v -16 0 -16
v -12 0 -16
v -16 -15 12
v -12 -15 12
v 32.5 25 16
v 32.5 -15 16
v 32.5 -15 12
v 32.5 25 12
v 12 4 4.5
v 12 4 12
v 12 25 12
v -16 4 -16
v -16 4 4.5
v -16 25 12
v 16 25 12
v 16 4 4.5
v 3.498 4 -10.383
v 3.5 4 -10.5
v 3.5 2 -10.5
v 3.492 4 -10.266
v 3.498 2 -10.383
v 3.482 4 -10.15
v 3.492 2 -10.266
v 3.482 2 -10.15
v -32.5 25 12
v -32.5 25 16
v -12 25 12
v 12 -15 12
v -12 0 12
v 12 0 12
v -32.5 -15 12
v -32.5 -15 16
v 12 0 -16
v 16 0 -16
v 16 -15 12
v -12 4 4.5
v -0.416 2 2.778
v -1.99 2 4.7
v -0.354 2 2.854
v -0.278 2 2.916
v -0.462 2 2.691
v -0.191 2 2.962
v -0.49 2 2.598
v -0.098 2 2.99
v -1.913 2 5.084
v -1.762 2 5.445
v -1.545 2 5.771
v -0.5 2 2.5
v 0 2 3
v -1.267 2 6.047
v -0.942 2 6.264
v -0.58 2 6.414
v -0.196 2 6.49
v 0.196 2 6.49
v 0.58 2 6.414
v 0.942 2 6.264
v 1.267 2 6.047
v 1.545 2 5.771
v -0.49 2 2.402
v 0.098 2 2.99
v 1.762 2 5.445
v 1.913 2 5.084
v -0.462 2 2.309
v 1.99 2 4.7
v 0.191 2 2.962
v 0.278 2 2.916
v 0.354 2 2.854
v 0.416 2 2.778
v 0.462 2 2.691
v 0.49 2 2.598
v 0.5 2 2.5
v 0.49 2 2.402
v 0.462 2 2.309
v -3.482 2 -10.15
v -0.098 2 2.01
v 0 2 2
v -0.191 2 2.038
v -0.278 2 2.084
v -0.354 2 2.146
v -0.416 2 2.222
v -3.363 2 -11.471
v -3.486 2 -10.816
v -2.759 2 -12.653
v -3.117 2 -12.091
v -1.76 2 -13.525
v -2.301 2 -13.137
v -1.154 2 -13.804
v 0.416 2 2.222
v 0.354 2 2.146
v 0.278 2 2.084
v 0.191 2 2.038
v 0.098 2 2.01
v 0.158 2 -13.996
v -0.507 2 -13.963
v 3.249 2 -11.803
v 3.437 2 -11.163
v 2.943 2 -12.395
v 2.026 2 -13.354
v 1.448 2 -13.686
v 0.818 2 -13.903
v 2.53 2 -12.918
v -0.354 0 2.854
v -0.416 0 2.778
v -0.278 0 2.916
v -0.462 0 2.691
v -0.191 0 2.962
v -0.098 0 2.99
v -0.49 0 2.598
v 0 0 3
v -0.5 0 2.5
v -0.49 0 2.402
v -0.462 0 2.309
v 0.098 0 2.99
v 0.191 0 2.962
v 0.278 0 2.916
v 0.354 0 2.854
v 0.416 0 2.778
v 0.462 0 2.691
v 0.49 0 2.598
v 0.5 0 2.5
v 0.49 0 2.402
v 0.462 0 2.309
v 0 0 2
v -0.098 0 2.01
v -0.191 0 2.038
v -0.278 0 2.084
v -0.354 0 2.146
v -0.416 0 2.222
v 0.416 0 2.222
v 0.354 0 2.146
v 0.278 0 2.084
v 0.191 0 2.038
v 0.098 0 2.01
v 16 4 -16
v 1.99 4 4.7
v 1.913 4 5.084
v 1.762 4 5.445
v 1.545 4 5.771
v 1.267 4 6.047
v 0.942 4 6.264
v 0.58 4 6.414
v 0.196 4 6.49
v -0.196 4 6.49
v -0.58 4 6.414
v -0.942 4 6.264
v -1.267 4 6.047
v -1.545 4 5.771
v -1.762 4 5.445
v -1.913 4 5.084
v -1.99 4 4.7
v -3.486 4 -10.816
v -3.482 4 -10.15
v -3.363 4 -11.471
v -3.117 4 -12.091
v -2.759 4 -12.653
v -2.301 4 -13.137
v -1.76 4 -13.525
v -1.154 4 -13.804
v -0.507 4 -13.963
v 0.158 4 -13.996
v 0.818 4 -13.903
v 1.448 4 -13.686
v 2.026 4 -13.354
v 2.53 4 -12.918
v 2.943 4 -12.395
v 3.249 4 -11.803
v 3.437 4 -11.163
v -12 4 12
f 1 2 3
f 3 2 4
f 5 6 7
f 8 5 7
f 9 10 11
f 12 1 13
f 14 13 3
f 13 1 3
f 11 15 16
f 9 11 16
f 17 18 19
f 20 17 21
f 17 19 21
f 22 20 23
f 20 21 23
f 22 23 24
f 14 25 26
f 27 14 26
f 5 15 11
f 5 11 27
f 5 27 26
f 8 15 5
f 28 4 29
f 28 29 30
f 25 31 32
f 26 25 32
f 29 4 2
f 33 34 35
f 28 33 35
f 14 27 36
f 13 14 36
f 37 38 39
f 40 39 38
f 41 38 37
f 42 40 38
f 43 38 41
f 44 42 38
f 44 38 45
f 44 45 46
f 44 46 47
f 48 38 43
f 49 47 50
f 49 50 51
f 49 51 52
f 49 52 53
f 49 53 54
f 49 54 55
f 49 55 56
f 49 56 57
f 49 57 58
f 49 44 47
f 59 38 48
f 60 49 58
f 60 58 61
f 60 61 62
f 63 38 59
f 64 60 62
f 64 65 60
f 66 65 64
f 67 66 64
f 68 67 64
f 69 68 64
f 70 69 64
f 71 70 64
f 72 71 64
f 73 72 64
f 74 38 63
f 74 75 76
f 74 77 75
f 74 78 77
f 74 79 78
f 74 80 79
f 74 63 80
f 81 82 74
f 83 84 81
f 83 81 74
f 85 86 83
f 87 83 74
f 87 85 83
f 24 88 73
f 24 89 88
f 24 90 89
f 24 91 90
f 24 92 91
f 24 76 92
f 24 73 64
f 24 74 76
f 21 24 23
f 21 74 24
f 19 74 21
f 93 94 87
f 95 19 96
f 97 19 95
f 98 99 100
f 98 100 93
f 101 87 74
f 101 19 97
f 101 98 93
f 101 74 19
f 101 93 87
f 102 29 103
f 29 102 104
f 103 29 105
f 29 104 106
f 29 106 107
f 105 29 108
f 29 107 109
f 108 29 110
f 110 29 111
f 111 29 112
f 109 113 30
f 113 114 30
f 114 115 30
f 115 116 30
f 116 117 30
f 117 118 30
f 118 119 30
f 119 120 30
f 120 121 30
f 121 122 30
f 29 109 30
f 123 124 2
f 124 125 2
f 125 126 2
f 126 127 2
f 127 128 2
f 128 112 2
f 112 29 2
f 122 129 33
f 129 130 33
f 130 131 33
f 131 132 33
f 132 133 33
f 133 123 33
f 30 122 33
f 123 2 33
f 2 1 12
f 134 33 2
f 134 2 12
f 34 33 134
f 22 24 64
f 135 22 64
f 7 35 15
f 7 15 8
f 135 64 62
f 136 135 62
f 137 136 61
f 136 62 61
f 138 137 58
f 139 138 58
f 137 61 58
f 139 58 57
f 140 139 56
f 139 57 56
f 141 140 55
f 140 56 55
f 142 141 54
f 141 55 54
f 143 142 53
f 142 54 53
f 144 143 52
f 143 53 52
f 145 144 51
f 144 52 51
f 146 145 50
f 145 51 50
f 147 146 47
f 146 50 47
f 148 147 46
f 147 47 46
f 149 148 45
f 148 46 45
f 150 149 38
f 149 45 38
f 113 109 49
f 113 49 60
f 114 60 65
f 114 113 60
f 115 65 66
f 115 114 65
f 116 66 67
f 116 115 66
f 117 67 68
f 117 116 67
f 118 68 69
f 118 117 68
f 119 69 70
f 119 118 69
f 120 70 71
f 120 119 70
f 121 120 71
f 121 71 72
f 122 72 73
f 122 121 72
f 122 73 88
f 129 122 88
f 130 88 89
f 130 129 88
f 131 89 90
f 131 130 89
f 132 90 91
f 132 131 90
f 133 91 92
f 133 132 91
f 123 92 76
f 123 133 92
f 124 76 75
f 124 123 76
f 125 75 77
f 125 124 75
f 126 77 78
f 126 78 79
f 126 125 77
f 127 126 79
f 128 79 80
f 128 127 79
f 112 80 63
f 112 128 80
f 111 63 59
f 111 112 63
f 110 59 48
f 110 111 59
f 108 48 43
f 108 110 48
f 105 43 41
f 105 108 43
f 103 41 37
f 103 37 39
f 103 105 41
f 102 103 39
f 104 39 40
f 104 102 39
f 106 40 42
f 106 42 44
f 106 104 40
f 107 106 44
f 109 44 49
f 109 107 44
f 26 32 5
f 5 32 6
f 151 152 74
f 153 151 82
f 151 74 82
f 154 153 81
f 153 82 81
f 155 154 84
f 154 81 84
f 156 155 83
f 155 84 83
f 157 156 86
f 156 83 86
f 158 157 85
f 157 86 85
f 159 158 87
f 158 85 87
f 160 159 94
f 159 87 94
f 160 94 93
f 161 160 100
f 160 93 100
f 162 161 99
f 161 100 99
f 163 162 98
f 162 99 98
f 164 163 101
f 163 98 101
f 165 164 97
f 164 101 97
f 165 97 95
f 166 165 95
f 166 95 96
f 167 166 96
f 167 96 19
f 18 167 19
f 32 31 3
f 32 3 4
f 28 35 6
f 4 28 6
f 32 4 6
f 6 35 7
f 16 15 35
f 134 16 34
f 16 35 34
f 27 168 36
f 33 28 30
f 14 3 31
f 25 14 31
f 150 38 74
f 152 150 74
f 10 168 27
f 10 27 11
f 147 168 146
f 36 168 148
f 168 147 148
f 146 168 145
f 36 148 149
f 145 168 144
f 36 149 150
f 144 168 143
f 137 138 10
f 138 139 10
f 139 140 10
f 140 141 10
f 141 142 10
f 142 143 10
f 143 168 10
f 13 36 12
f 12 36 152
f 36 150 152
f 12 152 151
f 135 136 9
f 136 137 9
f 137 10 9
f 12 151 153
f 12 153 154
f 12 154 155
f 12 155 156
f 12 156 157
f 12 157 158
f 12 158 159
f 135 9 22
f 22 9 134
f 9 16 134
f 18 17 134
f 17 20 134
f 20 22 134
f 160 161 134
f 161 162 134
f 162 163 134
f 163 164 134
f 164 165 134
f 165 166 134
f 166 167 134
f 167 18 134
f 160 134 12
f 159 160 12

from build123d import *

# Parameters (mm, degrees)
SKETCH_1_W               = 24
SKETCH_1_H               = 28
EXTRUDE_2_DEPTH          = 4
SKETCH_1_5_R             = 0.5
EXTRUDE_4_DEPTH          = 2
EXTRUDE_5_DEPTH          = 25
EXTRUDE_5_DEPTH_BACK     = 15
CUT_EXTRUDE_1_DEPTH      = 54.490653389
CUT_EXTRUDE_1_DEPTH_BACK = 54.490653389
CUT_EXTRUDE_2_DEPTH      = 54.490653389
CUT_EXTRUDE_2_DEPTH_BACK = 54.490653389
CUT_EXTRUDE_4_DEPTH      = 54.490653389
CUT_EXTRUDE_4_DEPTH_BACK = 54.490653389


with BuildPart() as part:
    # 草图1 → 凸台-拉伸2 (new body)
    with BuildSketch(Plane(origin=(0, 0, 0), x_dir=(1, 0, 0), z_dir=(0, 1, 0))):
        with Locations((0, 2)):
            Rectangle(SKETCH_1_W, SKETCH_1_H)
        with BuildLine():
            Line((-1.989974874, -4.7), (-3.48245603, 10.15))
            ThreePointArc((-3.48245603, 10.15), (-0.175219713, 13.995611256), (3.5, 10.5))
            ThreePointArc((3.5, 10.5), (3.495611256, 10.324780287), (3.48245603, 10.15))
            Line((3.48245603, 10.15), (1.989974874, -4.7))
            ThreePointArc((1.989974874, -4.7), (0, -6.5), (-1.989974874, -4.7))
        make_face(mode=Mode.SUBTRACT)
    extrude(amount=EXTRUDE_2_DEPTH)

    # 草图1<5> → 凸台-拉伸4 (add)
    with BuildSketch(Plane(origin=(0, 0, 0), x_dir=(1, 0, 0), z_dir=(0, 1, 0))):
        with BuildLine():
            Line((1.989974874, -4.7), (3.48245603, 10.15))
            ThreePointArc((3.48245603, 10.15), (0, 14), (-3.48245603, 10.15))
            Line((-3.48245603, 10.15), (-1.989974874, -4.7))
            ThreePointArc((-1.989974874, -4.7), (0, -6.5), (1.989974874, -4.7))
        make_face()
        with Locations((0, -2.5)):
            Circle(SKETCH_1_5_R, mode=Mode.SUBTRACT)
    extrude(amount=EXTRUDE_4_DEPTH)

    # 草图1<6> → 凸台-拉伸5 (add, two sides: drawn at the far end of the back side and taken through both)
    with BuildSketch(Plane(origin=(0, 0, 0), x_dir=(1, 0, 0), z_dir=(0, 1, 0)).offset(-EXTRUDE_5_DEPTH_BACK)):
        Polygon((-12, 16), (-16, 16), (-16, -12), (-32.5, -12), (-32.5, -16), (32.5, -16), (32.5, -12), (16, -12), (16, 16), (12, 16), (12, -12), (-12, -12), align=None)
    extrude(amount=EXTRUDE_5_DEPTH + EXTRUDE_5_DEPTH_BACK)

    # 草图5 → 切除-拉伸1 (cut, two sides: drawn at the far end of the back side and taken through both)
    with BuildSketch(Plane.ZY.offset(-12).offset(-CUT_EXTRUDE_1_DEPTH_BACK)):
        Polygon((-16, 4), (12, 25), (-16, 25), align=None)
    extrude(amount=CUT_EXTRUDE_1_DEPTH + CUT_EXTRUDE_1_DEPTH_BACK, mode=Mode.SUBTRACT)

    # 草图6 → 切除-拉伸2 (cut, two sides: drawn at the far end of the back side and taken through both)
    with BuildSketch(Plane.ZY.offset(-12).offset(-CUT_EXTRUDE_2_DEPTH_BACK)):
        Polygon((-16, 0), (12, -15), (-16, -15), align=None)
    extrude(amount=CUT_EXTRUDE_2_DEPTH + CUT_EXTRUDE_2_DEPTH_BACK, mode=Mode.SUBTRACT)

    # 草图8 → 切除-拉伸4 (cut, two sides: drawn at the far end of the back side and taken through both)
    with BuildSketch(Plane.ZY.offset(-12).offset(-CUT_EXTRUDE_4_DEPTH_BACK)):
        Polygon((4.5, 4), (-16, 4), (0.673039493, 16.50477962), (12, 25), align=None)
    extrude(amount=CUT_EXTRUDE_4_DEPTH + CUT_EXTRUDE_4_DEPTH_BACK, mode=Mode.SUBTRACT)


solid = part.part
